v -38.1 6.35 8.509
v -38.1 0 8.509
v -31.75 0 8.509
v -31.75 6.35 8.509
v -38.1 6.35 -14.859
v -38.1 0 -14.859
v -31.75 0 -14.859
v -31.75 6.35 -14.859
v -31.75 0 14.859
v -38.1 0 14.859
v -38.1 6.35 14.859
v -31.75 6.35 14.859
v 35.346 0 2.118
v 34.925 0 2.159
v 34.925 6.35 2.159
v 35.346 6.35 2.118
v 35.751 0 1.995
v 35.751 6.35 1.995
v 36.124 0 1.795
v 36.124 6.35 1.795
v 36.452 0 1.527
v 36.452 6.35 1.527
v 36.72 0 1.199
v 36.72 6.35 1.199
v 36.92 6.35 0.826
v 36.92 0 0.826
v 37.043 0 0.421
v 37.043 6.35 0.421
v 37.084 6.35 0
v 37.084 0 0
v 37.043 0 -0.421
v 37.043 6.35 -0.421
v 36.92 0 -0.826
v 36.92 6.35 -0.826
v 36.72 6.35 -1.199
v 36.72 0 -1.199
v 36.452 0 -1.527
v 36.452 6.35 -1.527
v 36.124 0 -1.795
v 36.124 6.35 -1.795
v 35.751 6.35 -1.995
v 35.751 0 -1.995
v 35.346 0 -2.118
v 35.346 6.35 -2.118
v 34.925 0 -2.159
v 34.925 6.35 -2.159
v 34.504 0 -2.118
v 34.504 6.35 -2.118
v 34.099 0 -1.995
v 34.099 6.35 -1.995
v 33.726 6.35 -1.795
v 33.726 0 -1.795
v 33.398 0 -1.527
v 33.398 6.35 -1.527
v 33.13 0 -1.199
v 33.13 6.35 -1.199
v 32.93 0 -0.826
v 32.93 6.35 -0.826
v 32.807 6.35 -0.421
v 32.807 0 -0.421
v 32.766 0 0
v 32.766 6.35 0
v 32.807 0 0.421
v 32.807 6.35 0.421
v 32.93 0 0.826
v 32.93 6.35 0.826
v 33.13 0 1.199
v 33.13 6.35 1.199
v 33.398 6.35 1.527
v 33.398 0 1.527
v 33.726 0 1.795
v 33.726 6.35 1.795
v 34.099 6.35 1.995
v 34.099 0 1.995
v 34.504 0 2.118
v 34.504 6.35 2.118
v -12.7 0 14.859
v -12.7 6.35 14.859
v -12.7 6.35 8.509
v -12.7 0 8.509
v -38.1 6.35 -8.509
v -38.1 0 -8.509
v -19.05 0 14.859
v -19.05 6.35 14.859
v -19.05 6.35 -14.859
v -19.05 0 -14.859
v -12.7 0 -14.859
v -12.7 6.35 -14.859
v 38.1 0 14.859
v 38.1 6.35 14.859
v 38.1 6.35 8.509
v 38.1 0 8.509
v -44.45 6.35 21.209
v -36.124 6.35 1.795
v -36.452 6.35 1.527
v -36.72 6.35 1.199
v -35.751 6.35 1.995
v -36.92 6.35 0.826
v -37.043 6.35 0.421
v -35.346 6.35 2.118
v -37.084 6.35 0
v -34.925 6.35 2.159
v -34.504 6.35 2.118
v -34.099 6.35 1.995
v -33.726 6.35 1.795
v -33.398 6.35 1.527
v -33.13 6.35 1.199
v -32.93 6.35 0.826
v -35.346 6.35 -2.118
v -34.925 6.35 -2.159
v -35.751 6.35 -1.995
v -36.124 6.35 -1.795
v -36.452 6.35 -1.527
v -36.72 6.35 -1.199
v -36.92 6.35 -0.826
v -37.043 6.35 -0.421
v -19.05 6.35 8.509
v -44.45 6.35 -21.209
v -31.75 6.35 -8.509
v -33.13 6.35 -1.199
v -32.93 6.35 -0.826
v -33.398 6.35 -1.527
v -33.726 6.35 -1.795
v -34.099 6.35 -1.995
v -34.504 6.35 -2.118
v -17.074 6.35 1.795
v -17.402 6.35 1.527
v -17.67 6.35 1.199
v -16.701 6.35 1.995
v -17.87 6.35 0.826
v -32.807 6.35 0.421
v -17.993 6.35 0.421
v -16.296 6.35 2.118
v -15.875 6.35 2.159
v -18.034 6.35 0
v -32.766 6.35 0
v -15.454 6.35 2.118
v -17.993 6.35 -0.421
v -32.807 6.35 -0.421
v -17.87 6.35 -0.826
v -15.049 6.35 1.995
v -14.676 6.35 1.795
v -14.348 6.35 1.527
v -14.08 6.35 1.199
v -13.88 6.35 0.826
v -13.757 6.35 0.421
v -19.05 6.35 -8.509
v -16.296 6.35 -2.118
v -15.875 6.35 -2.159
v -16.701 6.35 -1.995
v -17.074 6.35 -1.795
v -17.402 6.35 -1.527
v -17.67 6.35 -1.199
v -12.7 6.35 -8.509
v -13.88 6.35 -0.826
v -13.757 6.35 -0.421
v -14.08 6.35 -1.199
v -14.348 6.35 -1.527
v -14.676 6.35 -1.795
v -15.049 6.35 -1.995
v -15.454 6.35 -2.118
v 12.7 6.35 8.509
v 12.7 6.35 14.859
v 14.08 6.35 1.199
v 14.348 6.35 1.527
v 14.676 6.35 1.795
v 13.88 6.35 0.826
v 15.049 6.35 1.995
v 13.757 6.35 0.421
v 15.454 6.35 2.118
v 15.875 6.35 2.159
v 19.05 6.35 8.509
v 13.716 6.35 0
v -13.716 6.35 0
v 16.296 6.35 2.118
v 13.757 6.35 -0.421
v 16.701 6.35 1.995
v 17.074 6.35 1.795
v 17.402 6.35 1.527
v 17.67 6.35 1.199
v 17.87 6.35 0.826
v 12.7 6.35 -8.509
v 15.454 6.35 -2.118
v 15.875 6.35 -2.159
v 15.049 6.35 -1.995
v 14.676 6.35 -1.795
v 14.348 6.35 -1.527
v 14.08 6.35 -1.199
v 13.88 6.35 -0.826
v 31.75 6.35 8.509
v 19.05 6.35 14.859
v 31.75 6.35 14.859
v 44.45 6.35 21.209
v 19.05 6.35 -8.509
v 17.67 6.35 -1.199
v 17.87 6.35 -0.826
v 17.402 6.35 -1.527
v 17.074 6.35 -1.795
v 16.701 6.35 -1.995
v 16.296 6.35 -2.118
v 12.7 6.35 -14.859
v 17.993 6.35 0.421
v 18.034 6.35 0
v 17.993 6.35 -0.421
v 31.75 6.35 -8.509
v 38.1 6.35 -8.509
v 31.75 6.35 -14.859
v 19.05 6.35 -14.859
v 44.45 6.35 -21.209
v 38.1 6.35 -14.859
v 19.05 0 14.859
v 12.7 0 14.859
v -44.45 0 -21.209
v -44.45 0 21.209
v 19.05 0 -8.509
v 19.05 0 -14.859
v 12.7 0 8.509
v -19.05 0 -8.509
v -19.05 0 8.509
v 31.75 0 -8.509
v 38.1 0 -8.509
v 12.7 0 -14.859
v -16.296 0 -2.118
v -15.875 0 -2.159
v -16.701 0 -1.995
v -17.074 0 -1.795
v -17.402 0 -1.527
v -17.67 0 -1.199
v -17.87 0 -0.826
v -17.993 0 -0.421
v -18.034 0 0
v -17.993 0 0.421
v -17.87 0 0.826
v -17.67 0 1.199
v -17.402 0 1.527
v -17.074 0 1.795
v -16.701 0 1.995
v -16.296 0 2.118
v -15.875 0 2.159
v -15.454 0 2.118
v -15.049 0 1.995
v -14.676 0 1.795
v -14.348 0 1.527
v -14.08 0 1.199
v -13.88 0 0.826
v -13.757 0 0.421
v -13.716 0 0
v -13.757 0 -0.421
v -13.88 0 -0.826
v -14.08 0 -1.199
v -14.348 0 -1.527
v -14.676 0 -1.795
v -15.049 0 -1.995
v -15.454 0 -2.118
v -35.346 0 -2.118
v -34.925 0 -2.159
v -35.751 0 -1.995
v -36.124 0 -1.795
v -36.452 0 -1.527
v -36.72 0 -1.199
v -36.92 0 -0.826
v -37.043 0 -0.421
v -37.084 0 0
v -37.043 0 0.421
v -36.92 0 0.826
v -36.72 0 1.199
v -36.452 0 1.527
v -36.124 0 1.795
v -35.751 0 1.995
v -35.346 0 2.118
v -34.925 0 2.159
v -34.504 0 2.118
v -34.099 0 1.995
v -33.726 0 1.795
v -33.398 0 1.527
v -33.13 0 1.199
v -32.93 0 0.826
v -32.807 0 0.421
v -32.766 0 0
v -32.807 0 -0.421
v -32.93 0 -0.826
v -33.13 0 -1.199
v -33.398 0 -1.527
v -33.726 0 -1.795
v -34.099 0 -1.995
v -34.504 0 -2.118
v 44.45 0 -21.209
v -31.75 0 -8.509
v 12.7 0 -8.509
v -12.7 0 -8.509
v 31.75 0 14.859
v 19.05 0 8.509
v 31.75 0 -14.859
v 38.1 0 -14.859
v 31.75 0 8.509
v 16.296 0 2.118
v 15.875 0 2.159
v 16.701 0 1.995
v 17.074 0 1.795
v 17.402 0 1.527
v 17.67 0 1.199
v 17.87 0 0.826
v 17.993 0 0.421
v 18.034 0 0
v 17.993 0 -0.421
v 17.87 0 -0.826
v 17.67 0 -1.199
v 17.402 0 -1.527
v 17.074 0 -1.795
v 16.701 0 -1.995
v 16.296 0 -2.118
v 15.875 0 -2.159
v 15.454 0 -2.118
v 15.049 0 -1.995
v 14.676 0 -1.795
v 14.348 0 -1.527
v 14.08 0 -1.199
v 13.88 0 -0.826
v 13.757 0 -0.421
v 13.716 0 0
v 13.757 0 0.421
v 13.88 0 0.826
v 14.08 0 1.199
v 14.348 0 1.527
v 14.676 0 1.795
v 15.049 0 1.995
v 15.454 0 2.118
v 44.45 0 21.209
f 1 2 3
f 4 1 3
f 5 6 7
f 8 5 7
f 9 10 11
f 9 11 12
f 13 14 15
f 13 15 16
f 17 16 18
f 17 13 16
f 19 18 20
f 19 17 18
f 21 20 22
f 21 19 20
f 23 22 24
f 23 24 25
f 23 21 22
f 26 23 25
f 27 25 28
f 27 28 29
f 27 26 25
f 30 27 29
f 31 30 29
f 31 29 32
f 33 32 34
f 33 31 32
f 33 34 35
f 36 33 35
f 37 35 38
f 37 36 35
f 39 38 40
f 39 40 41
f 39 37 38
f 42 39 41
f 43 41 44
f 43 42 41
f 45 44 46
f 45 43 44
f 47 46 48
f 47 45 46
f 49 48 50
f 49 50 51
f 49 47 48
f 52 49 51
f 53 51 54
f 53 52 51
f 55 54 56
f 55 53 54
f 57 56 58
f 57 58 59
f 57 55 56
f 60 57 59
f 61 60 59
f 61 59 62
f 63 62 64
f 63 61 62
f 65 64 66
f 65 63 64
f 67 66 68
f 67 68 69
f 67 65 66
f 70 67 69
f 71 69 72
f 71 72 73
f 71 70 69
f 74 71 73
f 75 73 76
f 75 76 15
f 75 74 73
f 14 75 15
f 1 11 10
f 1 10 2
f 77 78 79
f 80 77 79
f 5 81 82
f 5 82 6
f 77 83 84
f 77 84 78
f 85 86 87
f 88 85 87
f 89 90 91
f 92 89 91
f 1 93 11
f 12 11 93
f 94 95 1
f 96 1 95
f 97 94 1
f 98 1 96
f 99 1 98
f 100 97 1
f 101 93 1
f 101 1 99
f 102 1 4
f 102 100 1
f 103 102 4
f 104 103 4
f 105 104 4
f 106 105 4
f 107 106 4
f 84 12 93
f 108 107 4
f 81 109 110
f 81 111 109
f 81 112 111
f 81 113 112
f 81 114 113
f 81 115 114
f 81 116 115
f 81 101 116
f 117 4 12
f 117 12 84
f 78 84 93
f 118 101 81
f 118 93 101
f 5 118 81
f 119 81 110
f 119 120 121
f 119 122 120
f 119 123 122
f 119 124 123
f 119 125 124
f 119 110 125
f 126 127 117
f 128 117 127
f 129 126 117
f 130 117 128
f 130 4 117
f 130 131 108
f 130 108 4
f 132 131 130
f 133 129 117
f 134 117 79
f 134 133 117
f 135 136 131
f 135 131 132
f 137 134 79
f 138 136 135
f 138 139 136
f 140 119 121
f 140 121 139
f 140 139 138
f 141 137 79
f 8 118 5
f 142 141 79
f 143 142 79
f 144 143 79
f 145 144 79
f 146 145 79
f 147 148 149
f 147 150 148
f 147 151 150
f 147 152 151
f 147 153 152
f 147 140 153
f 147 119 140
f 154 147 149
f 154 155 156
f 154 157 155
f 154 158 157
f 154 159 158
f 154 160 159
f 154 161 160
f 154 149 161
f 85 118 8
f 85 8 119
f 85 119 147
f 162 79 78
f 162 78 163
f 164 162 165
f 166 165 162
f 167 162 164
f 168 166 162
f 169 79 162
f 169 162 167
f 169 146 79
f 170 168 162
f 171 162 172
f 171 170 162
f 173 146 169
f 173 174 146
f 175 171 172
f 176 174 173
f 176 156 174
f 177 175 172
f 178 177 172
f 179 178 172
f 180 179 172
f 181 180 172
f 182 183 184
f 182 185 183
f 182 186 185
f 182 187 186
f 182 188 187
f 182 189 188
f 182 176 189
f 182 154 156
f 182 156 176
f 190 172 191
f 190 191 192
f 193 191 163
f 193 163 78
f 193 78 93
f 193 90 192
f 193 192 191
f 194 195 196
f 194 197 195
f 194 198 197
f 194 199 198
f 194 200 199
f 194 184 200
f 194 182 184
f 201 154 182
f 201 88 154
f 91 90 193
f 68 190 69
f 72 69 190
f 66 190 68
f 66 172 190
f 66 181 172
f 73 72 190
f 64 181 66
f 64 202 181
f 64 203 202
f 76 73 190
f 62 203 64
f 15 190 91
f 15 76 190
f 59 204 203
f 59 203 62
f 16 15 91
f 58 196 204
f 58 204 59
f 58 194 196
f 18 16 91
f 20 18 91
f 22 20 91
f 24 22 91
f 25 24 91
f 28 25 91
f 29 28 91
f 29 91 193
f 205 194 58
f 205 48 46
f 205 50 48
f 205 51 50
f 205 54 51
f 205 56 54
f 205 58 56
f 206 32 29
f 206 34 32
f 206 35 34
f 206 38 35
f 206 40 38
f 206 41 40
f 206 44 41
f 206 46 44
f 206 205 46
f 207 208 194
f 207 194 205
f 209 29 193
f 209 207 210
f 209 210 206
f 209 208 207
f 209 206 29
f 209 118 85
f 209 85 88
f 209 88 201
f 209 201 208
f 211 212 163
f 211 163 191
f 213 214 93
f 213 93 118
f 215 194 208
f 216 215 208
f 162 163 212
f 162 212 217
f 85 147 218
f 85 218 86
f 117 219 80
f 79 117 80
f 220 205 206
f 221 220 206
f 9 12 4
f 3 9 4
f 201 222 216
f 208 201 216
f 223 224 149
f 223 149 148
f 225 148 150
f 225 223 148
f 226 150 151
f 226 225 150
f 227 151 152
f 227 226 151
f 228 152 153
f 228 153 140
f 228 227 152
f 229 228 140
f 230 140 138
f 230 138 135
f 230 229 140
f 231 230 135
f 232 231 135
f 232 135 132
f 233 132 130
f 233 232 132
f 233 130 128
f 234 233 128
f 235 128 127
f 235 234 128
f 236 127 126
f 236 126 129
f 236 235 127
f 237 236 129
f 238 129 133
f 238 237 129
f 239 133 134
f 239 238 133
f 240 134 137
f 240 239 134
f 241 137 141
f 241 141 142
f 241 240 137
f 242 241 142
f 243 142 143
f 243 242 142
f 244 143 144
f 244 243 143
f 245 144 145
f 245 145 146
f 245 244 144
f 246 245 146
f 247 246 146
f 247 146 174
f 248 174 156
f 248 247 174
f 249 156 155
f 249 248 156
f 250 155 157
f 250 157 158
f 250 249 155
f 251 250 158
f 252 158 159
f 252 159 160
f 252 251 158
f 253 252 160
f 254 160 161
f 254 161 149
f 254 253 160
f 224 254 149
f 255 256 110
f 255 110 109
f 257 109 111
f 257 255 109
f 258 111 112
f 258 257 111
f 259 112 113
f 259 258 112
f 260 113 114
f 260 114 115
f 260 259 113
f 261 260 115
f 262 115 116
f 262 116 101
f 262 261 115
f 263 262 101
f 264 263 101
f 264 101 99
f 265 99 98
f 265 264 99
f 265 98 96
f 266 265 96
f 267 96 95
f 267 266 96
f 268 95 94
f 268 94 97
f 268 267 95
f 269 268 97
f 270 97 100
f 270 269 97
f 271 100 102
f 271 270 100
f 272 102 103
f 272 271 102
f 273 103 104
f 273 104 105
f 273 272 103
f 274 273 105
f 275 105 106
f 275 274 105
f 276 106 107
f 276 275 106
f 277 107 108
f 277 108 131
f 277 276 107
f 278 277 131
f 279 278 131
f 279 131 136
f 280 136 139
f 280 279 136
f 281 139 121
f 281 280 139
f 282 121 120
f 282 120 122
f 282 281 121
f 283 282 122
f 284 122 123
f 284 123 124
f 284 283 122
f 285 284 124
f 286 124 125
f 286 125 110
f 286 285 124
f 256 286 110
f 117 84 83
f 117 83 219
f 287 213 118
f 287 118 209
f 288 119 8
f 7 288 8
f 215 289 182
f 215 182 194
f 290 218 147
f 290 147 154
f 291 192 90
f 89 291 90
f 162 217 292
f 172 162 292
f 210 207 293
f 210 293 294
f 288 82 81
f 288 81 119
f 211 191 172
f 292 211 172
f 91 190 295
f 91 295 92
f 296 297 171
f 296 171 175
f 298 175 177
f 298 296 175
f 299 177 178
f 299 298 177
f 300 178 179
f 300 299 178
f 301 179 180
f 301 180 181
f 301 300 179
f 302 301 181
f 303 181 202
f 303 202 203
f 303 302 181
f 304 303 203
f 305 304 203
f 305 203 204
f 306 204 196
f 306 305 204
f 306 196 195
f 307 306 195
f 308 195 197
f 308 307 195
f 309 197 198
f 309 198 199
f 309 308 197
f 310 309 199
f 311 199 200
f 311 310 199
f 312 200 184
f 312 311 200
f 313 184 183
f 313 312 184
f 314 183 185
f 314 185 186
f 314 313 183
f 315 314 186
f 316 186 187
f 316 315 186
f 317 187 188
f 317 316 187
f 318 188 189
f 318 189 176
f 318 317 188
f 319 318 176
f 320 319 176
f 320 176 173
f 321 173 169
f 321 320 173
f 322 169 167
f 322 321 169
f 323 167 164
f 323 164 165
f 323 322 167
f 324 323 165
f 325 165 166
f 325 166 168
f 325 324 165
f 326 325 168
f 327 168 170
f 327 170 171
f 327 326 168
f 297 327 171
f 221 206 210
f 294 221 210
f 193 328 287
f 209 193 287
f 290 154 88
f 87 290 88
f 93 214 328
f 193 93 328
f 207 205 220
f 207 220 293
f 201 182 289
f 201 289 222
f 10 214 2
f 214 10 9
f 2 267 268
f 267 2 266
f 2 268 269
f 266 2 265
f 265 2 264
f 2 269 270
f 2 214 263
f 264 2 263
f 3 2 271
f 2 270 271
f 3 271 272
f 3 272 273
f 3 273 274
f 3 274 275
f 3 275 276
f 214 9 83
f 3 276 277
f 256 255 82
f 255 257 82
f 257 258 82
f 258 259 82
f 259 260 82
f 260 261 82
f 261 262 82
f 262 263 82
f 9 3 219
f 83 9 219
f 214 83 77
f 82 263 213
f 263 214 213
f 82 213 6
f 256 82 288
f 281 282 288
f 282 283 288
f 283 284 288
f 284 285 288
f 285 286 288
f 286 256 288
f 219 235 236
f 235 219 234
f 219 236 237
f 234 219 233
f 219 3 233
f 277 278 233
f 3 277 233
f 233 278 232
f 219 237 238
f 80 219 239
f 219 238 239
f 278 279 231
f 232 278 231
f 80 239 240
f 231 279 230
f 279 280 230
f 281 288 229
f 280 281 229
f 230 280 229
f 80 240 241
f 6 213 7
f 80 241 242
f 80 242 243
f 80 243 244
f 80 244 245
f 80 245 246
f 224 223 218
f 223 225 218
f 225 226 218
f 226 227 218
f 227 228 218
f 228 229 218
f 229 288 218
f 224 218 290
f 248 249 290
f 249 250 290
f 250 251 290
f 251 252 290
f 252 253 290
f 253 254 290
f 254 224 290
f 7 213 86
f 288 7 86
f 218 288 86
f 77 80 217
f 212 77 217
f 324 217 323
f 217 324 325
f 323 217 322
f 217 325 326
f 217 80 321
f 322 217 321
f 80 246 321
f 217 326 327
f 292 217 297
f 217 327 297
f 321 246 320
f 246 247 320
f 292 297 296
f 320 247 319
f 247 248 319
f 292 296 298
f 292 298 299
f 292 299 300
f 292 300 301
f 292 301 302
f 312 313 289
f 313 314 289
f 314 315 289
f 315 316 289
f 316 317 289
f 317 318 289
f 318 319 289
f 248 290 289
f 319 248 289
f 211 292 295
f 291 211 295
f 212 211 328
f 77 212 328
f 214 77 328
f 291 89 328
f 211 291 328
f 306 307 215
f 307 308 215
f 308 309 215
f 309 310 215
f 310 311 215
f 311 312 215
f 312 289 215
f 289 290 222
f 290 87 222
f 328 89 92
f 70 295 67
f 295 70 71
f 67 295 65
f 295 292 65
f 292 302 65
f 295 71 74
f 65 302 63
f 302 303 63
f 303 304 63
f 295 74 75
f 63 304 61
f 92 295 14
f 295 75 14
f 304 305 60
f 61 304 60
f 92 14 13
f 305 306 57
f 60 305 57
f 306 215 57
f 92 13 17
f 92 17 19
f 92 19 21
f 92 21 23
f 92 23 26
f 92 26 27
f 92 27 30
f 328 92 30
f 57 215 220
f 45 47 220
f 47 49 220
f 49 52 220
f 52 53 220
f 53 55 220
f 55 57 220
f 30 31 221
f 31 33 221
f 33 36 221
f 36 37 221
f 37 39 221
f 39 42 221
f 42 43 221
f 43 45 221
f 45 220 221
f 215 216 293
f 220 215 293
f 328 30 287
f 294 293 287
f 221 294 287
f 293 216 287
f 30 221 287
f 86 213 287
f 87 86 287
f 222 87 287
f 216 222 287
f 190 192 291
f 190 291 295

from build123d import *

# Parameters (mm, degrees)
ELEVATOR_SPACER_W   = 88.9
ELEVATOR_SPACER_H   = 42.418
ELEVATOR_SPACER_R   = 2.159
ELEVATOR_SPACER_W_2 = 6.35
ELEVATOR_SPACER_H_2 = 6.35
BOSS_EXTRUDE1_DEPTH = 6.35


with BuildPart() as part:
    # Elevator Spacer → Boss-Extrude1 (new body)
    with BuildSketch(Plane(origin=(0, 0, 0), x_dir=(1, 0, 0), z_dir=(0, 1, 0))):
        Rectangle(ELEVATOR_SPACER_W, ELEVATOR_SPACER_H)
        with Locations(Location((34.925, 0, 0), (0, 0, 270))):
            Circle(ELEVATOR_SPACER_R, mode=Mode.SUBTRACT)
        with Locations(Location((15.875, 0, 0), (0, 0, 270))):
            Circle(ELEVATOR_SPACER_R, mode=Mode.SUBTRACT)
        with Locations(Location((-15.875, 0, 0), (0, 0, 90))):
            Circle(ELEVATOR_SPACER_R, mode=Mode.SUBTRACT)
        with Locations(Location((-34.925, 0, 0), (0, 0, 90))):
            Circle(ELEVATOR_SPACER_R, mode=Mode.SUBTRACT)
        with Locations((34.925, 11.684)):
            Rectangle(ELEVATOR_SPACER_W_2, ELEVATOR_SPACER_H_2, mode=Mode.SUBTRACT)
        with Locations((34.925, -11.684)):
            Rectangle(ELEVATOR_SPACER_W_2, ELEVATOR_SPACER_H_2, mode=Mode.SUBTRACT)
        with Locations((15.875, 11.684)):
            Rectangle(ELEVATOR_SPACER_W_2, ELEVATOR_SPACER_H_2, mode=Mode.SUBTRACT)
        with Locations((15.875, -11.684)):
            Rectangle(ELEVATOR_SPACER_W_2, ELEVATOR_SPACER_H_2, mode=Mode.SUBTRACT)
        with Locations((-15.875, -11.684)):
            Rectangle(ELEVATOR_SPACER_W_2, ELEVATOR_SPACER_H_2, mode=Mode.SUBTRACT)
        with Locations((-15.875, 11.684)):
            Rectangle(ELEVATOR_SPACER_W_2, ELEVATOR_SPACER_H_2, mode=Mode.SUBTRACT)
        with Locations((-34.925, -11.684)):
            Rectangle(ELEVATOR_SPACER_W_2, ELEVATOR_SPACER_H_2, mode=Mode.SUBTRACT)
        with Locations((-34.925, 11.684)):
            Rectangle(ELEVATOR_SPACER_W_2, ELEVATOR_SPACER_H_2, mode=Mode.SUBTRACT)
    extrude(amount=BOSS_EXTRUDE1_DEPTH)


solid = part.part
